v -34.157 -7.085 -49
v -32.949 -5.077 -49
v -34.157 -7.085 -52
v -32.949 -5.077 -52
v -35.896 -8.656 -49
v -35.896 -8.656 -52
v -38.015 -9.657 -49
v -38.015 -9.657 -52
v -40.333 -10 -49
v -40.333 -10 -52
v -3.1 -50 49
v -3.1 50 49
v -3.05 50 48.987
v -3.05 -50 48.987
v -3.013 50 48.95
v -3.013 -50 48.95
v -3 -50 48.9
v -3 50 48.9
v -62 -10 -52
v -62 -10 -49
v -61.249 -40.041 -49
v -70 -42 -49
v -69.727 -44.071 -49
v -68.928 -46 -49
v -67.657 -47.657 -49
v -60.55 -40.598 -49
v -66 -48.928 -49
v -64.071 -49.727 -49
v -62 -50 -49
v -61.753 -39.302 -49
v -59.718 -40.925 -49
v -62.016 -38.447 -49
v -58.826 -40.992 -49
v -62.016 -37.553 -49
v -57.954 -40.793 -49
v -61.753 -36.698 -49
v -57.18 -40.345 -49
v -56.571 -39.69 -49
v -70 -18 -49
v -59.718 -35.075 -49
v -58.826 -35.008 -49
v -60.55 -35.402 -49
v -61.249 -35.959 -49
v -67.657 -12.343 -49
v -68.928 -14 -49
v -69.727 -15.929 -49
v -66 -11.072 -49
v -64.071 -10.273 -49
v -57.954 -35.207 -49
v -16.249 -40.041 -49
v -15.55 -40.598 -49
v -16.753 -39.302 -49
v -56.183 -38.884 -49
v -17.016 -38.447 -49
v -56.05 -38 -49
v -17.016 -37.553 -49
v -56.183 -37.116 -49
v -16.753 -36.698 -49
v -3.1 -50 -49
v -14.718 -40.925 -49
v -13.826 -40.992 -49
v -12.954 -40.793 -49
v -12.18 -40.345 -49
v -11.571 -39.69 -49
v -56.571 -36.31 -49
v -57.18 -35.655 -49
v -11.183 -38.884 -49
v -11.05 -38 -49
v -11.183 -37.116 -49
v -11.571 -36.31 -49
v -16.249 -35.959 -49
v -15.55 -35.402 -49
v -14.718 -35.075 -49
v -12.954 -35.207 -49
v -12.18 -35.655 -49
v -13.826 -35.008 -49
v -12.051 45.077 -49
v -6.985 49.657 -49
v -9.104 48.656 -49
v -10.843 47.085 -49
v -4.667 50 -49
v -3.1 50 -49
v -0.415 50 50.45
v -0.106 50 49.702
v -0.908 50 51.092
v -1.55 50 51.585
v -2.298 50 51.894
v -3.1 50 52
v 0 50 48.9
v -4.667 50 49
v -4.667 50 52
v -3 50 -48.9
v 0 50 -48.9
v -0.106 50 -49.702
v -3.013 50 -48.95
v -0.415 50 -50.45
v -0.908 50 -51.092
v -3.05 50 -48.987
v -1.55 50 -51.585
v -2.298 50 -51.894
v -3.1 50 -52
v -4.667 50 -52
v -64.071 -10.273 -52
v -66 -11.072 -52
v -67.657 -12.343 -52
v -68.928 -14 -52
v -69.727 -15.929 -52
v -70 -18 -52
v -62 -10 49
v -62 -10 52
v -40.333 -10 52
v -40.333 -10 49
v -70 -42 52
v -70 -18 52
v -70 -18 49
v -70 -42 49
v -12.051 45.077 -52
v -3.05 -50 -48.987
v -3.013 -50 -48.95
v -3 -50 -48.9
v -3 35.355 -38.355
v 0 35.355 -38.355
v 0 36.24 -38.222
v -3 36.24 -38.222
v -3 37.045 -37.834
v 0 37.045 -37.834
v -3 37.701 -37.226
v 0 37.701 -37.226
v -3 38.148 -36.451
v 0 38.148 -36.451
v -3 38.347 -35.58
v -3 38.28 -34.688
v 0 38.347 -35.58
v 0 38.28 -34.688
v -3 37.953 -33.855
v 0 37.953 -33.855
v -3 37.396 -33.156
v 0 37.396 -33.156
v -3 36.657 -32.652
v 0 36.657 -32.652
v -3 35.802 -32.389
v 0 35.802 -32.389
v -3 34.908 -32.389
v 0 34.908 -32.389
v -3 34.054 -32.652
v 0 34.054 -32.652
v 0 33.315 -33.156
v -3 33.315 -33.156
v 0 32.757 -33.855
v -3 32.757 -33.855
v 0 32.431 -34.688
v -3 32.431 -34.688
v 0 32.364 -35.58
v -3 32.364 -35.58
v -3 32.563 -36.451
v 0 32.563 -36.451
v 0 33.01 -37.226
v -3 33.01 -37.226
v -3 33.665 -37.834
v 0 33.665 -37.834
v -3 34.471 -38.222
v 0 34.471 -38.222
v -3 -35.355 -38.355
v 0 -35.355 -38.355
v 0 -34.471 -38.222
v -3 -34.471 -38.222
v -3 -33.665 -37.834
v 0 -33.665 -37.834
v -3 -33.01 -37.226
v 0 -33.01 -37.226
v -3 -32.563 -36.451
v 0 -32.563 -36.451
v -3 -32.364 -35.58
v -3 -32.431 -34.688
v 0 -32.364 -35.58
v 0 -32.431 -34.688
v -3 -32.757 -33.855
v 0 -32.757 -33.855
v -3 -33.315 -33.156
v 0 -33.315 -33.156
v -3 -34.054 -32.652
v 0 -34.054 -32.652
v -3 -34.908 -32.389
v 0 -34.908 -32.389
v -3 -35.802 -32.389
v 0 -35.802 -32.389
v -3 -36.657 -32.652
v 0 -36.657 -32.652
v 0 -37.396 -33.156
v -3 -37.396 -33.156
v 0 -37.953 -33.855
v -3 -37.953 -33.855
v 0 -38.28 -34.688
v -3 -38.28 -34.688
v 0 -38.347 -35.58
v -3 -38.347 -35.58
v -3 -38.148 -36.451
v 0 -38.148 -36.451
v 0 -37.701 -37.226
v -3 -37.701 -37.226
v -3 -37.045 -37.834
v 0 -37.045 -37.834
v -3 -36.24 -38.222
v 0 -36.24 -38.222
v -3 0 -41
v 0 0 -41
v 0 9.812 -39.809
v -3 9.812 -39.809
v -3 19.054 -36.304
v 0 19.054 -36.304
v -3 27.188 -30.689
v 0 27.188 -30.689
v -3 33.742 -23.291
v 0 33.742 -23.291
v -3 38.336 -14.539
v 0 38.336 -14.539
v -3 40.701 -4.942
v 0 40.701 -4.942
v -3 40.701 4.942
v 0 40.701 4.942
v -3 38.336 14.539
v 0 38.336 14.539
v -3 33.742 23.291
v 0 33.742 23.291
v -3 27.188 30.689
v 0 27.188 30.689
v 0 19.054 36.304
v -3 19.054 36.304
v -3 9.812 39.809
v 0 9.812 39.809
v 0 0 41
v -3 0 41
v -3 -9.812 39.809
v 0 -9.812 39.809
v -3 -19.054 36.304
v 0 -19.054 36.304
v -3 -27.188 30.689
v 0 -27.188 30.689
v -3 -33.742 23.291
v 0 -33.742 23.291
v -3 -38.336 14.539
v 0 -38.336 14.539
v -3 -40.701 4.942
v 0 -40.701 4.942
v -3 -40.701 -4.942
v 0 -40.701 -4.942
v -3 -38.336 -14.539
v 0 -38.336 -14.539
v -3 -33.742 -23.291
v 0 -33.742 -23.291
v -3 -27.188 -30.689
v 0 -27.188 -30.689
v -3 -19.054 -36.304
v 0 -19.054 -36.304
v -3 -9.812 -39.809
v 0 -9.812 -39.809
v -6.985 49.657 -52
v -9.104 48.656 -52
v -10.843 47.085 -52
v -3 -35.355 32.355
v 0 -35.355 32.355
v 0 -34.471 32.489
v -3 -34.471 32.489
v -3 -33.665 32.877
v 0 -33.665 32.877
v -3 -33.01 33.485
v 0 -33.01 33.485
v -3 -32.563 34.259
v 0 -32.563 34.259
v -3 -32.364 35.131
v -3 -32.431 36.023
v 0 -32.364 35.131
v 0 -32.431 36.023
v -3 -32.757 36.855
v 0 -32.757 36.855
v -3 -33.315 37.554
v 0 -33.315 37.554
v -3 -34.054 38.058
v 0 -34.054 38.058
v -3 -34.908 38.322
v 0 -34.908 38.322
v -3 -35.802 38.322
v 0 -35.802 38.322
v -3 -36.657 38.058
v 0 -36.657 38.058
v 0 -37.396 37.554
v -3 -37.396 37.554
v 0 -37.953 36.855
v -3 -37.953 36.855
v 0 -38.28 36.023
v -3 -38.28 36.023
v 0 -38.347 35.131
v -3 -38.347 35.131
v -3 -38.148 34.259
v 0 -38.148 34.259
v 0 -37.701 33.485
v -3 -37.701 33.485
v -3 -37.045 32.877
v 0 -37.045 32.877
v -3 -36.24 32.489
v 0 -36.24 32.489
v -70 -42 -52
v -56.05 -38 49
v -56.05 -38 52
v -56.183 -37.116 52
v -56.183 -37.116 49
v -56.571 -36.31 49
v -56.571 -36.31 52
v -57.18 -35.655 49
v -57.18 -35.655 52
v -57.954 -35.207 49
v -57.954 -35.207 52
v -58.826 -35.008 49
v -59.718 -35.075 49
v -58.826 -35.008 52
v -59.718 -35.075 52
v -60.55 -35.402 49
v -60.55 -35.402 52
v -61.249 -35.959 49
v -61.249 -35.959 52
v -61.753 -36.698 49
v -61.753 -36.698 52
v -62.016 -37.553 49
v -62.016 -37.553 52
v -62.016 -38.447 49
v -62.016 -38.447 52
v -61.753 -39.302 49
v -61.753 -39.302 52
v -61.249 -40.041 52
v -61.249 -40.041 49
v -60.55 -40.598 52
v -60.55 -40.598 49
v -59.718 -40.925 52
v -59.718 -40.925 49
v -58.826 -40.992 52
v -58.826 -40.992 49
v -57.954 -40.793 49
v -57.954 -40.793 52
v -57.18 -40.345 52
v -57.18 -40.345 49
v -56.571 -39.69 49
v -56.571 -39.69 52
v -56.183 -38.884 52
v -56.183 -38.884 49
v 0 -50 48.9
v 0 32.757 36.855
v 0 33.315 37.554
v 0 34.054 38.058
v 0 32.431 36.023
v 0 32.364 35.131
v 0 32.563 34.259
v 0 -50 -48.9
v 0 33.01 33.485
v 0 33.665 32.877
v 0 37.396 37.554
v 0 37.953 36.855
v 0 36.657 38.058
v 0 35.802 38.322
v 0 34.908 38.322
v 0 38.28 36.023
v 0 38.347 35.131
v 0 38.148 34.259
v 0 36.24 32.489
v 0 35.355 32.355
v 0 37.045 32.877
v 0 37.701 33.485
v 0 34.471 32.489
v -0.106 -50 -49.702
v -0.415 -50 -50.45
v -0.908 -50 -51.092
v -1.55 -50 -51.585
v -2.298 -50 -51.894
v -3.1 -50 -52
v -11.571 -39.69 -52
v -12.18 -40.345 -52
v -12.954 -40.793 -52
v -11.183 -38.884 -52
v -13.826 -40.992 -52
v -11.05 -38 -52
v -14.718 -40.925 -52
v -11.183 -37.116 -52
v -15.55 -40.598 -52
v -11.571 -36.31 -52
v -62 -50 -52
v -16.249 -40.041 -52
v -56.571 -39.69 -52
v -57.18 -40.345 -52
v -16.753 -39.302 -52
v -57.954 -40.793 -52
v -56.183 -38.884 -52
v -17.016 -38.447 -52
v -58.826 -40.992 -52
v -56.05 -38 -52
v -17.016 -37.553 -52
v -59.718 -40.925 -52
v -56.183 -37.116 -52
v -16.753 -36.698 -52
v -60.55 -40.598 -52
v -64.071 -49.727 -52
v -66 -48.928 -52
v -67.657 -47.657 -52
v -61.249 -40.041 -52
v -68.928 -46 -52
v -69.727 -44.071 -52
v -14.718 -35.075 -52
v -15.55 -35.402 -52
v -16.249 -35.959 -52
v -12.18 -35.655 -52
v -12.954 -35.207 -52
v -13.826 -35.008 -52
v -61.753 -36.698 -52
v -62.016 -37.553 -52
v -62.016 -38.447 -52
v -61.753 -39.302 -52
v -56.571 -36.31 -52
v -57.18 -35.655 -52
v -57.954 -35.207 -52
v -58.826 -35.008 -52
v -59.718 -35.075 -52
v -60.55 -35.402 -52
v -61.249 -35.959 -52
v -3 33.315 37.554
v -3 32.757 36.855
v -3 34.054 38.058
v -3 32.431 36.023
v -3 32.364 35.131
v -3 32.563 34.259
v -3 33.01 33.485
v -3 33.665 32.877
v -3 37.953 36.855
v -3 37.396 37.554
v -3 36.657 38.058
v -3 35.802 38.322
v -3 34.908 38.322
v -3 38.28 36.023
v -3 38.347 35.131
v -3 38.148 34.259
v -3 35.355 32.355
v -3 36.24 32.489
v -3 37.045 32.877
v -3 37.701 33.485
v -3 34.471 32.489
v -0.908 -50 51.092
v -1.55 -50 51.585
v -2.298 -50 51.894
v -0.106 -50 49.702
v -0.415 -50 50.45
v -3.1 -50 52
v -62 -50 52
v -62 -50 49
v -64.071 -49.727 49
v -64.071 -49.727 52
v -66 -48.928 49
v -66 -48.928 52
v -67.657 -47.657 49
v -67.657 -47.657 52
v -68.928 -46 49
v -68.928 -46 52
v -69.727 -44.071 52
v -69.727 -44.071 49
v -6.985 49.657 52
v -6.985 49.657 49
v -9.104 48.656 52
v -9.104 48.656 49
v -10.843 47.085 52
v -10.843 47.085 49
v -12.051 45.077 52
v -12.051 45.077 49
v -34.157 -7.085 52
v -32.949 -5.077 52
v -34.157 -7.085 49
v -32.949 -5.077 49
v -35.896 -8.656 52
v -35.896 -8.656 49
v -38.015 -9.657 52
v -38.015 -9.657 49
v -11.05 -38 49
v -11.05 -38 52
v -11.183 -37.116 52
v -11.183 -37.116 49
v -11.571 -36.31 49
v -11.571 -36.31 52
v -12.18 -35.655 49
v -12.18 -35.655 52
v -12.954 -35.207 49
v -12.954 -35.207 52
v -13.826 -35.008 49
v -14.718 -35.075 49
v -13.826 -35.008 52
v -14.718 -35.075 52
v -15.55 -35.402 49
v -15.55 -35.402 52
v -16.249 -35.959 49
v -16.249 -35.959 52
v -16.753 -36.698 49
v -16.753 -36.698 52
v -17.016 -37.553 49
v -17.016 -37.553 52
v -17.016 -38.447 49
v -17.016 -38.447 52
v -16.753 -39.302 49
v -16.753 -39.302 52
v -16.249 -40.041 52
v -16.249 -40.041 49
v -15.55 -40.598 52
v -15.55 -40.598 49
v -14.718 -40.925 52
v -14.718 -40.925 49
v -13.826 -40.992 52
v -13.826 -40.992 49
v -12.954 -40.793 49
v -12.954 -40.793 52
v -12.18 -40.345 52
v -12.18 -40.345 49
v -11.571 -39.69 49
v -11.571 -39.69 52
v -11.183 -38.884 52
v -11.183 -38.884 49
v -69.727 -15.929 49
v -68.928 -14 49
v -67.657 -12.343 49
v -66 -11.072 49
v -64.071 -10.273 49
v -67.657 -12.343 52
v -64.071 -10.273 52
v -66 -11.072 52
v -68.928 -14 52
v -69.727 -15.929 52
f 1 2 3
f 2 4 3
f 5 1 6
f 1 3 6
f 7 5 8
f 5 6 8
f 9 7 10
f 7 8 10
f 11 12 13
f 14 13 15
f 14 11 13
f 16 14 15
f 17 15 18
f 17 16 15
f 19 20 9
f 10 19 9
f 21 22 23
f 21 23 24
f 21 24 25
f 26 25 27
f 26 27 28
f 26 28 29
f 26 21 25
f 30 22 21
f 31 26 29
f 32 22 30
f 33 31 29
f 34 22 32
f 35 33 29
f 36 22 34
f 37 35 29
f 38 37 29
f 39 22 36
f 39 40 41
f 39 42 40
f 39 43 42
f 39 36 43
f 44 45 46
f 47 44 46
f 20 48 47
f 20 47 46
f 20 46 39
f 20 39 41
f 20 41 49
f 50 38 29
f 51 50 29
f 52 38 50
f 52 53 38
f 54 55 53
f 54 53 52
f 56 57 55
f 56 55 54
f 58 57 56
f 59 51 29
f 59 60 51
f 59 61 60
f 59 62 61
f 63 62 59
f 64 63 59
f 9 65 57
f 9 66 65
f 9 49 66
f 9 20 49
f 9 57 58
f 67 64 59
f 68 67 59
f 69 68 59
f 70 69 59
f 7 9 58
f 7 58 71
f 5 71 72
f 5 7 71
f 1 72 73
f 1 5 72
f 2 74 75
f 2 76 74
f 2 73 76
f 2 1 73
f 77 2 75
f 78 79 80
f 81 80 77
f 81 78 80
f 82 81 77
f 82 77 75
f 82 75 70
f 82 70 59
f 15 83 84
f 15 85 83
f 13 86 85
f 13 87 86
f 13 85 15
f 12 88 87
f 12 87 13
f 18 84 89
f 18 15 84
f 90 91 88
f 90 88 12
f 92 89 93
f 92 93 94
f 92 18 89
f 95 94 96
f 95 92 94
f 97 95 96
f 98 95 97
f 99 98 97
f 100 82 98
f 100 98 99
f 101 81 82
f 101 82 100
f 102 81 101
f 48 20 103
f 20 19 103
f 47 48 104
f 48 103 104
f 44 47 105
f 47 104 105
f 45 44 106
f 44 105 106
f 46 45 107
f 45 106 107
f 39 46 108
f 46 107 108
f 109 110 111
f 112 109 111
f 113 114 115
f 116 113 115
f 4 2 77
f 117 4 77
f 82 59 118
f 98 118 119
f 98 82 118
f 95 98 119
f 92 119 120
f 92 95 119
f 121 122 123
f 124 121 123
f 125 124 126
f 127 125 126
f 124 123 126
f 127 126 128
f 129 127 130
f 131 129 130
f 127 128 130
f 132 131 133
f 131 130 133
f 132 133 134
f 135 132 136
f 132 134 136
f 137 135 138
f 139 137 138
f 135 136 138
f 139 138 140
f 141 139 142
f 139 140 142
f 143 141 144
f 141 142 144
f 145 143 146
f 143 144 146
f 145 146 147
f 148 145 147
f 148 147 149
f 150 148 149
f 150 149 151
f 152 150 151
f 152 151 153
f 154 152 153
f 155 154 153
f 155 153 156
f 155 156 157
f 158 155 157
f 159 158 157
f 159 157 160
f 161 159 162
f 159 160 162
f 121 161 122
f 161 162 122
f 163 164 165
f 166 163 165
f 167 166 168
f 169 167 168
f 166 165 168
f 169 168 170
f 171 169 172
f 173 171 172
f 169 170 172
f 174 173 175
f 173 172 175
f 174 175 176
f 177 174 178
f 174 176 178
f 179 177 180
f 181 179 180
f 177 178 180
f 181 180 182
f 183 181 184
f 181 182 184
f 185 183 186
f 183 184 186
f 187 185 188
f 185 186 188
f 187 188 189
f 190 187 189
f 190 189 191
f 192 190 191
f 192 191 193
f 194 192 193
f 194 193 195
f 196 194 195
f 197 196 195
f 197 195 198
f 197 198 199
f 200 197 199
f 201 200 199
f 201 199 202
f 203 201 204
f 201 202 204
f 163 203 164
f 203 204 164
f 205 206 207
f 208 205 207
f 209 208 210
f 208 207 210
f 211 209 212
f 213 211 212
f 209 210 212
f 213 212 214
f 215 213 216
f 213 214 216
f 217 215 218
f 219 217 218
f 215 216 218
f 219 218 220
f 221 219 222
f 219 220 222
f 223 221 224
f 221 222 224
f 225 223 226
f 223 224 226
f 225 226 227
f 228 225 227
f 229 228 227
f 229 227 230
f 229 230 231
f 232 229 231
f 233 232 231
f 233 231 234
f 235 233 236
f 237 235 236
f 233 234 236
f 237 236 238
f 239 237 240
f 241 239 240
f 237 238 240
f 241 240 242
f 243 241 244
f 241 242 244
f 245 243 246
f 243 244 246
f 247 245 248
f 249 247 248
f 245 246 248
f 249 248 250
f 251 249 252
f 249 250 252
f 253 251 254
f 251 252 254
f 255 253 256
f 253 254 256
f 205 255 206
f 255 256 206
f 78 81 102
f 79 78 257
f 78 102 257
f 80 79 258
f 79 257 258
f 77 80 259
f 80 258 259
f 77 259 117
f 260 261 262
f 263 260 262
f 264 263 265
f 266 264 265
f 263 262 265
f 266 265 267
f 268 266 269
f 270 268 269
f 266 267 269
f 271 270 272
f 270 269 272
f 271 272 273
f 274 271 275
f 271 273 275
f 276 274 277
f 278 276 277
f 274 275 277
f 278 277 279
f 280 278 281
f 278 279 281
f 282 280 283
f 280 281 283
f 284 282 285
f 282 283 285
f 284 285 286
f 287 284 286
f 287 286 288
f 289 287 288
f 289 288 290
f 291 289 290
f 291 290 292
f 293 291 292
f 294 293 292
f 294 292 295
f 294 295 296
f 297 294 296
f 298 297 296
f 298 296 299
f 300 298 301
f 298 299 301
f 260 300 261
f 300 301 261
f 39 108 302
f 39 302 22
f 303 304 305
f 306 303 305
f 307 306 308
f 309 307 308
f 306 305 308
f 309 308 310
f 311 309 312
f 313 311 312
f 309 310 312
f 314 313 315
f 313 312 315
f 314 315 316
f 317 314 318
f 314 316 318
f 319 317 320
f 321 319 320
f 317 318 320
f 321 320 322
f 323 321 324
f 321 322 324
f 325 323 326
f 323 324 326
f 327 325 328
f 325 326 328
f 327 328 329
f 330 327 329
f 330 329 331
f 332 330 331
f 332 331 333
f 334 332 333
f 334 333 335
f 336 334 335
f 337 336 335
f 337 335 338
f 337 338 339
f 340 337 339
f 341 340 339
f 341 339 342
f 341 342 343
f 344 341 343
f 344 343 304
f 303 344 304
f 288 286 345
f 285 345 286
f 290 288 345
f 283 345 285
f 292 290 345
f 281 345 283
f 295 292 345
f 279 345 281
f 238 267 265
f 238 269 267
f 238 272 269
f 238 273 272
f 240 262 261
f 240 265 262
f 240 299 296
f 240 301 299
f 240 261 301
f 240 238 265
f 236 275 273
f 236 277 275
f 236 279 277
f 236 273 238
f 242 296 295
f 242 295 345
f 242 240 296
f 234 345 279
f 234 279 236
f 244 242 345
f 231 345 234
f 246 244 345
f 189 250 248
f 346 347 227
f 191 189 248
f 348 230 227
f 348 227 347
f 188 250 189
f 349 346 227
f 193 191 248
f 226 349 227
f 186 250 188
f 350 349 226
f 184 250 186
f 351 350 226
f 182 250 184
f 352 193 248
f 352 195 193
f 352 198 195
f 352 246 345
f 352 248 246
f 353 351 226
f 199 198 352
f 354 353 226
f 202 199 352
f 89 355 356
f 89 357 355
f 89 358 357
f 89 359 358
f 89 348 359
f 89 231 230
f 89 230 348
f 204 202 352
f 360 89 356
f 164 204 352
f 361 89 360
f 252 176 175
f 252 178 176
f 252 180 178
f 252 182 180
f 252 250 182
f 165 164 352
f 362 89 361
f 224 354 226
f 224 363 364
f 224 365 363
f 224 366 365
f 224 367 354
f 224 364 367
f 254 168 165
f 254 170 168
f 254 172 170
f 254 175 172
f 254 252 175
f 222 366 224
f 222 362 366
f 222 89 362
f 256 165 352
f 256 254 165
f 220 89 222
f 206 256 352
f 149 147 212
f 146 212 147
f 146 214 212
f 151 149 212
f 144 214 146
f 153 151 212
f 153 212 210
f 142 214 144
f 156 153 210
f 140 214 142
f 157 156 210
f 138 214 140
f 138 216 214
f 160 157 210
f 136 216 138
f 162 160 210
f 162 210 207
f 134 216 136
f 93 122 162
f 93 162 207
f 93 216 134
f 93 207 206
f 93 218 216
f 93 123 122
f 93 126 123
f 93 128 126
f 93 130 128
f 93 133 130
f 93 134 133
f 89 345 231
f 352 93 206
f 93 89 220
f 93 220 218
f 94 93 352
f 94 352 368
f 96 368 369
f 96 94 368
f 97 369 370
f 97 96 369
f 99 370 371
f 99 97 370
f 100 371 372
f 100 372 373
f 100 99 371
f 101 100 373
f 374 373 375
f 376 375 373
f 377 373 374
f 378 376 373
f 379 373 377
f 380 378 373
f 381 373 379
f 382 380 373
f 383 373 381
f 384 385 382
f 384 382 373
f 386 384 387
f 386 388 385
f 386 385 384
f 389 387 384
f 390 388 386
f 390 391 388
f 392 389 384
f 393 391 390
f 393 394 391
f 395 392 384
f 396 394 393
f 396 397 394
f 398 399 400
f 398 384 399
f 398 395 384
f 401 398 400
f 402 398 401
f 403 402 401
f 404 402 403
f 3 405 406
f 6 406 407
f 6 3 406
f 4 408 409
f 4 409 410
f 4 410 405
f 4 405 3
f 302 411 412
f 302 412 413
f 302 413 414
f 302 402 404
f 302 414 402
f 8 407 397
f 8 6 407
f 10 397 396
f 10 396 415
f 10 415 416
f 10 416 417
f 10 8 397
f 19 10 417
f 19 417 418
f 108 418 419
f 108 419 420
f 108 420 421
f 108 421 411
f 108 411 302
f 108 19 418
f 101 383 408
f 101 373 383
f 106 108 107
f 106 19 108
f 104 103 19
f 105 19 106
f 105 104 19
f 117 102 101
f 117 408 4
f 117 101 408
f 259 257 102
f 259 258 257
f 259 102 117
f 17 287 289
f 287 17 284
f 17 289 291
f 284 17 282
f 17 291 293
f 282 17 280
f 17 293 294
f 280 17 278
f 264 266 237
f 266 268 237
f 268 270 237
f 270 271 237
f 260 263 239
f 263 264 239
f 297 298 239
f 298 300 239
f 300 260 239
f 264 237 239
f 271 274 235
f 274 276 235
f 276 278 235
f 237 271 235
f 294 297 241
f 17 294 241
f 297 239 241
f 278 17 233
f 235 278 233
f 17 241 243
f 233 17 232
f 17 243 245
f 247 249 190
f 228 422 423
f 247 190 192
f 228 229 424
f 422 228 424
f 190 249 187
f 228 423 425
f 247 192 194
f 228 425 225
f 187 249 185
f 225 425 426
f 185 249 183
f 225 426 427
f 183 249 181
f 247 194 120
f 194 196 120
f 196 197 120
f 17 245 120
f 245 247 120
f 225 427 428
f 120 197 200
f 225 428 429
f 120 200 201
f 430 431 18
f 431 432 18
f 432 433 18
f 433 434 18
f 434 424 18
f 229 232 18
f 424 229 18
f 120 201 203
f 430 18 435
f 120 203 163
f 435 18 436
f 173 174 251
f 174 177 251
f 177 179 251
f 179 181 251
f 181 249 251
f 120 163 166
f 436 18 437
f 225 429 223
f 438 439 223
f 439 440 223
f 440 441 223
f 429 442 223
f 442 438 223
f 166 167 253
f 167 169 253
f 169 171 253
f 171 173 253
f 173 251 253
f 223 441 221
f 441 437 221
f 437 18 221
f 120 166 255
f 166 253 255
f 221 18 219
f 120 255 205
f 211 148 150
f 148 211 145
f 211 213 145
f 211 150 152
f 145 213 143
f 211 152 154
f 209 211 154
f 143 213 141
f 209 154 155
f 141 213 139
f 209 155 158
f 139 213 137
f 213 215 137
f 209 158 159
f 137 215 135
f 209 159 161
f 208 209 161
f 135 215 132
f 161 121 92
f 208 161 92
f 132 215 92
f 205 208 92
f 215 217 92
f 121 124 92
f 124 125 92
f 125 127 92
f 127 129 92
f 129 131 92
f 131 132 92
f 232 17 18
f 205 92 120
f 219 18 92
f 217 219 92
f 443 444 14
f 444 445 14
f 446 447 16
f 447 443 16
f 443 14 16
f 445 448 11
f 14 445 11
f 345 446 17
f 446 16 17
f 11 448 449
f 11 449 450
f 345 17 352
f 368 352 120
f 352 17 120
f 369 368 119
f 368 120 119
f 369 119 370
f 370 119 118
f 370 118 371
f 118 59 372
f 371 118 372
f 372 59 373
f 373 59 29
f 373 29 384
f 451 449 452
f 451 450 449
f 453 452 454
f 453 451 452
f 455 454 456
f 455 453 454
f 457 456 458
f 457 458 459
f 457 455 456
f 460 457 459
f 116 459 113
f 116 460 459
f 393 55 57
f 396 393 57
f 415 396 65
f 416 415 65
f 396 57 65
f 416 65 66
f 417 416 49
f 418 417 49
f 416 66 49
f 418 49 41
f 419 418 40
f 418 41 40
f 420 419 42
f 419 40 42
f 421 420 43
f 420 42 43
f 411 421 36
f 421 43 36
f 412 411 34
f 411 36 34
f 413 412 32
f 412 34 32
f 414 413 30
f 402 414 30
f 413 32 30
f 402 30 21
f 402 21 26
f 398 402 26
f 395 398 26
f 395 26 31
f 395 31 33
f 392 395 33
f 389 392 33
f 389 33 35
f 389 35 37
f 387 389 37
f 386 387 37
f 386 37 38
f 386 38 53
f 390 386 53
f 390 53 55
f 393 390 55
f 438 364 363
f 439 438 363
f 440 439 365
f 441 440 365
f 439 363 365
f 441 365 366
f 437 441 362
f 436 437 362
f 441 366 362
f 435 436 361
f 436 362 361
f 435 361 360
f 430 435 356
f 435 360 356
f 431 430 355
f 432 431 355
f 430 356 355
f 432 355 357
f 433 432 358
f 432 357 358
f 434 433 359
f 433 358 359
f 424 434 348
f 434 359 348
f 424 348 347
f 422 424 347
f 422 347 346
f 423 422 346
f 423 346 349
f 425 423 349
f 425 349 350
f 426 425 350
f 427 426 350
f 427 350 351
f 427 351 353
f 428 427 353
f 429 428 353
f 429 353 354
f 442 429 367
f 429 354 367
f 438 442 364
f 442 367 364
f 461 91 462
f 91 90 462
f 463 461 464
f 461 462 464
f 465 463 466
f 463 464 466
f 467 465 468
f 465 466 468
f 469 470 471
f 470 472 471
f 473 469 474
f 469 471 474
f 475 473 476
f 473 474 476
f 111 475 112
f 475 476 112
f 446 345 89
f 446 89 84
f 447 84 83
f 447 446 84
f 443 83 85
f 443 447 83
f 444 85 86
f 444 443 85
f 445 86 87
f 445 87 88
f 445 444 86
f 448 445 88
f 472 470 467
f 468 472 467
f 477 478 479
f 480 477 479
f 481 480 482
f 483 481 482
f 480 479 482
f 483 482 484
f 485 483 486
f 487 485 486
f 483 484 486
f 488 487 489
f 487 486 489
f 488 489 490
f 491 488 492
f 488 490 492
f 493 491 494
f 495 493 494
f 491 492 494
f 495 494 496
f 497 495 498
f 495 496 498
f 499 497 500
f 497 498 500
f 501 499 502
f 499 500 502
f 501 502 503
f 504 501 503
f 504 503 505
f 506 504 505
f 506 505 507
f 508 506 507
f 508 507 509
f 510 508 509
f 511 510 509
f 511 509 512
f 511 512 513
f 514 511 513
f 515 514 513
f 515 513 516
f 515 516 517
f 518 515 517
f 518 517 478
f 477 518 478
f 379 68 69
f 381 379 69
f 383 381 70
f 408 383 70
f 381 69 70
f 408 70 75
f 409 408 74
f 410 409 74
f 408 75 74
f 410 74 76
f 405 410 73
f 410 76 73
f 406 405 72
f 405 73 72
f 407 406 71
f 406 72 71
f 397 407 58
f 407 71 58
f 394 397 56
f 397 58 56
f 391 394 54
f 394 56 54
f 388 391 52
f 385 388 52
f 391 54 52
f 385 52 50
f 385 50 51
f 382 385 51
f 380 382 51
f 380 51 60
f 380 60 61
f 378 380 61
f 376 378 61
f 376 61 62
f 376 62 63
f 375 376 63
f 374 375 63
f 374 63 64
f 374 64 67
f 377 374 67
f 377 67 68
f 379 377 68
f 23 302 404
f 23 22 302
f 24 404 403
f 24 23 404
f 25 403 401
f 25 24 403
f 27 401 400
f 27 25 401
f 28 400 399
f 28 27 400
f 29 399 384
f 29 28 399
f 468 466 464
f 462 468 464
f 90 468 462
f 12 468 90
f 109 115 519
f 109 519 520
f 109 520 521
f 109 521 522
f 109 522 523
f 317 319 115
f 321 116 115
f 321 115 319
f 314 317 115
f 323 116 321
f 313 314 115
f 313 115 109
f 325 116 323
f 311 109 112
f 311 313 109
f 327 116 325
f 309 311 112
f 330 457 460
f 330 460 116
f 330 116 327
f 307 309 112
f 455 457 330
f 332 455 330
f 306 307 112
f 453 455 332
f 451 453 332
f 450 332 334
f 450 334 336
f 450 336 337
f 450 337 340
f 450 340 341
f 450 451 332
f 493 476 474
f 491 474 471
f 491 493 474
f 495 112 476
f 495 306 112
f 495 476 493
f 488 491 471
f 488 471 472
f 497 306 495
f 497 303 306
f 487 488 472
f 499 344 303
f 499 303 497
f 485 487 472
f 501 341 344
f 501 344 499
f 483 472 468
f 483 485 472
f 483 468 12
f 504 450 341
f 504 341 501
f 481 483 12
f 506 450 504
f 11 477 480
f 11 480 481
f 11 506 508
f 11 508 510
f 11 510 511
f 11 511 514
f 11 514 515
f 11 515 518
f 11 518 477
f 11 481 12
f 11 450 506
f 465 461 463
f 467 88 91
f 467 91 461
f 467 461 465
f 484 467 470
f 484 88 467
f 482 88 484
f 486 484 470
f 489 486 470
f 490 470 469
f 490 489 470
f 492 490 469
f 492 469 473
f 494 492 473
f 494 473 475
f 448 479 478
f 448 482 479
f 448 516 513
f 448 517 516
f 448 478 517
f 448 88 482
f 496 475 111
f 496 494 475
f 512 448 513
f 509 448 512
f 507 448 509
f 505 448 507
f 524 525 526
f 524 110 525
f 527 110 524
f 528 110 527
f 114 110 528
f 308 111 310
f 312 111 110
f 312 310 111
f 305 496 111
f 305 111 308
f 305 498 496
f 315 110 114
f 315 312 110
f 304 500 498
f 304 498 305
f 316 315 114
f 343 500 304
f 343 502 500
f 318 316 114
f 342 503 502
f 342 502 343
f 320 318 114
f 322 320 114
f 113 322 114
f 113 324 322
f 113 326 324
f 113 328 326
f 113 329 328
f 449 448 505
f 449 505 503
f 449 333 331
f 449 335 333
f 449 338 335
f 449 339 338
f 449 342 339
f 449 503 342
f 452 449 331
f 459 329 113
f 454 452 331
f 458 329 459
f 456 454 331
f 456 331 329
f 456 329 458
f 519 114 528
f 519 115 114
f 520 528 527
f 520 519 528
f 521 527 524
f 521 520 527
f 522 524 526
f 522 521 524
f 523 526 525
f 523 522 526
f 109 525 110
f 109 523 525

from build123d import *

# Parameters (mm, degrees)
SKETCH_1_W                         = 98
SKETCH_1_H                         = 100
SKETCH_1_R                         = 41
SKETCH_1_R_2                       = 3
SM_BASE_FLANGE_1_DEPTH             = 3
SM_EDGE_FLANGE_1_STRIP_W           = 12.2
SM_EDGE_FLANGE_1_STRIP_H           = 3
SM_EDGE_FLANGE_1_STRIP_CUT_DEPTH   = 100
SM_EDGE_FLANGE_1_STRIP_2_W         = 12.2
SM_EDGE_FLANGE_1_STRIP_2_H         = 3
SM_EDGE_FLANGE_1_STRIP_CUT_2_DEPTH = 100
SM_EDGE_FLANGE_1_DEPTH             = 100
SM_EDGE_FLANGE_1_BEND_DEPTH        = 100
SKETCH_8_R                         = 3
CUT_EXTRUDE_1_DEPTH                = 135.96666255
FILLET_1_R                         = 8


# Sheet-metal steps are written as plain solids
with BuildPart() as part:
    # Sketch 1 → 基体-法兰1 (new body)
    with BuildSketch(Plane(origin=(0, 0, 0), x_dir=(0, 0, -1), z_dir=(1, 0, 0))):
        Rectangle(SKETCH_1_W, SKETCH_1_H)
        Circle(SKETCH_1_R, mode=Mode.SUBTRACT)
        with Locations((-35.355339059, 35.355339059)):
            Circle(SKETCH_1_R_2, mode=Mode.SUBTRACT)
        with Locations((35.355339059, 35.355339059)):
            Circle(SKETCH_1_R_2, mode=Mode.SUBTRACT)
        with Locations((35.355339059, -35.355339059)):
            Circle(SKETCH_1_R_2, mode=Mode.SUBTRACT)
        with Locations((-35.355339059, -35.355339059)):
            Circle(SKETCH_1_R_2, mode=Mode.SUBTRACT)
    extrude(amount=-SM_BASE_FLANGE_1_DEPTH)

    # 边线-法兰1 strip (across the edge) → 边线-法兰1 strip cut (cut)
    with BuildSketch(Plane(origin=(-3, -50, 49), x_dir=(0, 0, -1), z_dir=(0, 1, 0))):
        with Locations((-6, -1.5)):
            Rectangle(SM_EDGE_FLANGE_1_STRIP_W, SM_EDGE_FLANGE_1_STRIP_H)
    extrude(amount=SM_EDGE_FLANGE_1_STRIP_CUT_DEPTH, mode=Mode.SUBTRACT)

    # 边线-法兰1 strip 2 (across the edge) → 边线-法兰1 strip cut 2 (cut)
    with BuildSketch(Plane(origin=(-3, 50, -49), x_dir=(0, 0, 1), z_dir=(0, -1, 0))):
        with Locations((-6, -1.5)):
            Rectangle(SM_EDGE_FLANGE_1_STRIP_2_W, SM_EDGE_FLANGE_1_STRIP_2_H)
    extrude(amount=SM_EDGE_FLANGE_1_STRIP_CUT_2_DEPTH, mode=Mode.SUBTRACT)

    # 边线-法兰1 section (across the edge) → 边线-法兰1 (add)
    with BuildSketch(Plane(origin=(-3, -50, 49), x_dir=(0, 0, -1), z_dir=(0, 1, 0))):
        with BuildLine():
            Line((-3, 0.1), (-3, 67))
            Line((-3, 67), (0, 67))
            Line((0, 67), (0, 0.1))
            ThreePointArc((0, 0.1), (0.029289322, 0.029289322), (0.1, 0))
            Line((0.1, 0), (0.1, -3))
            ThreePointArc((0.1, -3), (-2.092031022, -2.092031022), (-3, 0.1))
        make_face()
    extrude(amount=SM_EDGE_FLANGE_1_DEPTH)

    # 边线-法兰1 section 2 (across the edge) → 边线-法兰1 bend (add)
    with BuildSketch(Plane(origin=(-3, 50, -49), x_dir=(0, 0, 1), z_dir=(0, -1, 0))):
        with BuildLine():
            Line((-3, 0.1), (-3, 67))
            Line((-3, 67), (0, 67))
            Line((0, 67), (0, 0.1))
            ThreePointArc((0, 0.1), (0.029289322, 0.029289322), (0.1, 0))
            Line((0.1, 0), (0.1, -3))
            ThreePointArc((0.1, -3), (-2.092031022, -2.092031022), (-3, 0.1))
        make_face()
    extrude(amount=SM_EDGE_FLANGE_1_BEND_DEPTH)

    # 草图8 → 切除-拉伸1 (cut, through all)
    with BuildSketch(Plane.XY.offset(52)):
        with Locations((-14.05, -38)):
            Circle(SKETCH_8_R)
        with Locations((-59.05, -38)):
            Circle(SKETCH_8_R)
        Polygon((-10, 50), (-70, 50), (-70, -10), (-35, -10), align=None)
    extrude(amount=-CUT_EXTRUDE_1_DEPTH, mode=Mode.SUBTRACT)

    # 圆角1
    fillet_1_edges = [part.edges().sort_by_distance(p)[0] for p in [
        (-10, 50, 50.5),
        (-70, -10, 50.5),
        (-35, -10, 50.5),
        (-10, 50, -50.5),
        (-35, -10, -50.5),
        (-70, -10, -50.5),
        (-70, -50, 50.5),
        (-70, -50, -50.5),
    ]]
    fillet(fillet_1_edges, radius=FILLET_1_R)


solid = part.part
